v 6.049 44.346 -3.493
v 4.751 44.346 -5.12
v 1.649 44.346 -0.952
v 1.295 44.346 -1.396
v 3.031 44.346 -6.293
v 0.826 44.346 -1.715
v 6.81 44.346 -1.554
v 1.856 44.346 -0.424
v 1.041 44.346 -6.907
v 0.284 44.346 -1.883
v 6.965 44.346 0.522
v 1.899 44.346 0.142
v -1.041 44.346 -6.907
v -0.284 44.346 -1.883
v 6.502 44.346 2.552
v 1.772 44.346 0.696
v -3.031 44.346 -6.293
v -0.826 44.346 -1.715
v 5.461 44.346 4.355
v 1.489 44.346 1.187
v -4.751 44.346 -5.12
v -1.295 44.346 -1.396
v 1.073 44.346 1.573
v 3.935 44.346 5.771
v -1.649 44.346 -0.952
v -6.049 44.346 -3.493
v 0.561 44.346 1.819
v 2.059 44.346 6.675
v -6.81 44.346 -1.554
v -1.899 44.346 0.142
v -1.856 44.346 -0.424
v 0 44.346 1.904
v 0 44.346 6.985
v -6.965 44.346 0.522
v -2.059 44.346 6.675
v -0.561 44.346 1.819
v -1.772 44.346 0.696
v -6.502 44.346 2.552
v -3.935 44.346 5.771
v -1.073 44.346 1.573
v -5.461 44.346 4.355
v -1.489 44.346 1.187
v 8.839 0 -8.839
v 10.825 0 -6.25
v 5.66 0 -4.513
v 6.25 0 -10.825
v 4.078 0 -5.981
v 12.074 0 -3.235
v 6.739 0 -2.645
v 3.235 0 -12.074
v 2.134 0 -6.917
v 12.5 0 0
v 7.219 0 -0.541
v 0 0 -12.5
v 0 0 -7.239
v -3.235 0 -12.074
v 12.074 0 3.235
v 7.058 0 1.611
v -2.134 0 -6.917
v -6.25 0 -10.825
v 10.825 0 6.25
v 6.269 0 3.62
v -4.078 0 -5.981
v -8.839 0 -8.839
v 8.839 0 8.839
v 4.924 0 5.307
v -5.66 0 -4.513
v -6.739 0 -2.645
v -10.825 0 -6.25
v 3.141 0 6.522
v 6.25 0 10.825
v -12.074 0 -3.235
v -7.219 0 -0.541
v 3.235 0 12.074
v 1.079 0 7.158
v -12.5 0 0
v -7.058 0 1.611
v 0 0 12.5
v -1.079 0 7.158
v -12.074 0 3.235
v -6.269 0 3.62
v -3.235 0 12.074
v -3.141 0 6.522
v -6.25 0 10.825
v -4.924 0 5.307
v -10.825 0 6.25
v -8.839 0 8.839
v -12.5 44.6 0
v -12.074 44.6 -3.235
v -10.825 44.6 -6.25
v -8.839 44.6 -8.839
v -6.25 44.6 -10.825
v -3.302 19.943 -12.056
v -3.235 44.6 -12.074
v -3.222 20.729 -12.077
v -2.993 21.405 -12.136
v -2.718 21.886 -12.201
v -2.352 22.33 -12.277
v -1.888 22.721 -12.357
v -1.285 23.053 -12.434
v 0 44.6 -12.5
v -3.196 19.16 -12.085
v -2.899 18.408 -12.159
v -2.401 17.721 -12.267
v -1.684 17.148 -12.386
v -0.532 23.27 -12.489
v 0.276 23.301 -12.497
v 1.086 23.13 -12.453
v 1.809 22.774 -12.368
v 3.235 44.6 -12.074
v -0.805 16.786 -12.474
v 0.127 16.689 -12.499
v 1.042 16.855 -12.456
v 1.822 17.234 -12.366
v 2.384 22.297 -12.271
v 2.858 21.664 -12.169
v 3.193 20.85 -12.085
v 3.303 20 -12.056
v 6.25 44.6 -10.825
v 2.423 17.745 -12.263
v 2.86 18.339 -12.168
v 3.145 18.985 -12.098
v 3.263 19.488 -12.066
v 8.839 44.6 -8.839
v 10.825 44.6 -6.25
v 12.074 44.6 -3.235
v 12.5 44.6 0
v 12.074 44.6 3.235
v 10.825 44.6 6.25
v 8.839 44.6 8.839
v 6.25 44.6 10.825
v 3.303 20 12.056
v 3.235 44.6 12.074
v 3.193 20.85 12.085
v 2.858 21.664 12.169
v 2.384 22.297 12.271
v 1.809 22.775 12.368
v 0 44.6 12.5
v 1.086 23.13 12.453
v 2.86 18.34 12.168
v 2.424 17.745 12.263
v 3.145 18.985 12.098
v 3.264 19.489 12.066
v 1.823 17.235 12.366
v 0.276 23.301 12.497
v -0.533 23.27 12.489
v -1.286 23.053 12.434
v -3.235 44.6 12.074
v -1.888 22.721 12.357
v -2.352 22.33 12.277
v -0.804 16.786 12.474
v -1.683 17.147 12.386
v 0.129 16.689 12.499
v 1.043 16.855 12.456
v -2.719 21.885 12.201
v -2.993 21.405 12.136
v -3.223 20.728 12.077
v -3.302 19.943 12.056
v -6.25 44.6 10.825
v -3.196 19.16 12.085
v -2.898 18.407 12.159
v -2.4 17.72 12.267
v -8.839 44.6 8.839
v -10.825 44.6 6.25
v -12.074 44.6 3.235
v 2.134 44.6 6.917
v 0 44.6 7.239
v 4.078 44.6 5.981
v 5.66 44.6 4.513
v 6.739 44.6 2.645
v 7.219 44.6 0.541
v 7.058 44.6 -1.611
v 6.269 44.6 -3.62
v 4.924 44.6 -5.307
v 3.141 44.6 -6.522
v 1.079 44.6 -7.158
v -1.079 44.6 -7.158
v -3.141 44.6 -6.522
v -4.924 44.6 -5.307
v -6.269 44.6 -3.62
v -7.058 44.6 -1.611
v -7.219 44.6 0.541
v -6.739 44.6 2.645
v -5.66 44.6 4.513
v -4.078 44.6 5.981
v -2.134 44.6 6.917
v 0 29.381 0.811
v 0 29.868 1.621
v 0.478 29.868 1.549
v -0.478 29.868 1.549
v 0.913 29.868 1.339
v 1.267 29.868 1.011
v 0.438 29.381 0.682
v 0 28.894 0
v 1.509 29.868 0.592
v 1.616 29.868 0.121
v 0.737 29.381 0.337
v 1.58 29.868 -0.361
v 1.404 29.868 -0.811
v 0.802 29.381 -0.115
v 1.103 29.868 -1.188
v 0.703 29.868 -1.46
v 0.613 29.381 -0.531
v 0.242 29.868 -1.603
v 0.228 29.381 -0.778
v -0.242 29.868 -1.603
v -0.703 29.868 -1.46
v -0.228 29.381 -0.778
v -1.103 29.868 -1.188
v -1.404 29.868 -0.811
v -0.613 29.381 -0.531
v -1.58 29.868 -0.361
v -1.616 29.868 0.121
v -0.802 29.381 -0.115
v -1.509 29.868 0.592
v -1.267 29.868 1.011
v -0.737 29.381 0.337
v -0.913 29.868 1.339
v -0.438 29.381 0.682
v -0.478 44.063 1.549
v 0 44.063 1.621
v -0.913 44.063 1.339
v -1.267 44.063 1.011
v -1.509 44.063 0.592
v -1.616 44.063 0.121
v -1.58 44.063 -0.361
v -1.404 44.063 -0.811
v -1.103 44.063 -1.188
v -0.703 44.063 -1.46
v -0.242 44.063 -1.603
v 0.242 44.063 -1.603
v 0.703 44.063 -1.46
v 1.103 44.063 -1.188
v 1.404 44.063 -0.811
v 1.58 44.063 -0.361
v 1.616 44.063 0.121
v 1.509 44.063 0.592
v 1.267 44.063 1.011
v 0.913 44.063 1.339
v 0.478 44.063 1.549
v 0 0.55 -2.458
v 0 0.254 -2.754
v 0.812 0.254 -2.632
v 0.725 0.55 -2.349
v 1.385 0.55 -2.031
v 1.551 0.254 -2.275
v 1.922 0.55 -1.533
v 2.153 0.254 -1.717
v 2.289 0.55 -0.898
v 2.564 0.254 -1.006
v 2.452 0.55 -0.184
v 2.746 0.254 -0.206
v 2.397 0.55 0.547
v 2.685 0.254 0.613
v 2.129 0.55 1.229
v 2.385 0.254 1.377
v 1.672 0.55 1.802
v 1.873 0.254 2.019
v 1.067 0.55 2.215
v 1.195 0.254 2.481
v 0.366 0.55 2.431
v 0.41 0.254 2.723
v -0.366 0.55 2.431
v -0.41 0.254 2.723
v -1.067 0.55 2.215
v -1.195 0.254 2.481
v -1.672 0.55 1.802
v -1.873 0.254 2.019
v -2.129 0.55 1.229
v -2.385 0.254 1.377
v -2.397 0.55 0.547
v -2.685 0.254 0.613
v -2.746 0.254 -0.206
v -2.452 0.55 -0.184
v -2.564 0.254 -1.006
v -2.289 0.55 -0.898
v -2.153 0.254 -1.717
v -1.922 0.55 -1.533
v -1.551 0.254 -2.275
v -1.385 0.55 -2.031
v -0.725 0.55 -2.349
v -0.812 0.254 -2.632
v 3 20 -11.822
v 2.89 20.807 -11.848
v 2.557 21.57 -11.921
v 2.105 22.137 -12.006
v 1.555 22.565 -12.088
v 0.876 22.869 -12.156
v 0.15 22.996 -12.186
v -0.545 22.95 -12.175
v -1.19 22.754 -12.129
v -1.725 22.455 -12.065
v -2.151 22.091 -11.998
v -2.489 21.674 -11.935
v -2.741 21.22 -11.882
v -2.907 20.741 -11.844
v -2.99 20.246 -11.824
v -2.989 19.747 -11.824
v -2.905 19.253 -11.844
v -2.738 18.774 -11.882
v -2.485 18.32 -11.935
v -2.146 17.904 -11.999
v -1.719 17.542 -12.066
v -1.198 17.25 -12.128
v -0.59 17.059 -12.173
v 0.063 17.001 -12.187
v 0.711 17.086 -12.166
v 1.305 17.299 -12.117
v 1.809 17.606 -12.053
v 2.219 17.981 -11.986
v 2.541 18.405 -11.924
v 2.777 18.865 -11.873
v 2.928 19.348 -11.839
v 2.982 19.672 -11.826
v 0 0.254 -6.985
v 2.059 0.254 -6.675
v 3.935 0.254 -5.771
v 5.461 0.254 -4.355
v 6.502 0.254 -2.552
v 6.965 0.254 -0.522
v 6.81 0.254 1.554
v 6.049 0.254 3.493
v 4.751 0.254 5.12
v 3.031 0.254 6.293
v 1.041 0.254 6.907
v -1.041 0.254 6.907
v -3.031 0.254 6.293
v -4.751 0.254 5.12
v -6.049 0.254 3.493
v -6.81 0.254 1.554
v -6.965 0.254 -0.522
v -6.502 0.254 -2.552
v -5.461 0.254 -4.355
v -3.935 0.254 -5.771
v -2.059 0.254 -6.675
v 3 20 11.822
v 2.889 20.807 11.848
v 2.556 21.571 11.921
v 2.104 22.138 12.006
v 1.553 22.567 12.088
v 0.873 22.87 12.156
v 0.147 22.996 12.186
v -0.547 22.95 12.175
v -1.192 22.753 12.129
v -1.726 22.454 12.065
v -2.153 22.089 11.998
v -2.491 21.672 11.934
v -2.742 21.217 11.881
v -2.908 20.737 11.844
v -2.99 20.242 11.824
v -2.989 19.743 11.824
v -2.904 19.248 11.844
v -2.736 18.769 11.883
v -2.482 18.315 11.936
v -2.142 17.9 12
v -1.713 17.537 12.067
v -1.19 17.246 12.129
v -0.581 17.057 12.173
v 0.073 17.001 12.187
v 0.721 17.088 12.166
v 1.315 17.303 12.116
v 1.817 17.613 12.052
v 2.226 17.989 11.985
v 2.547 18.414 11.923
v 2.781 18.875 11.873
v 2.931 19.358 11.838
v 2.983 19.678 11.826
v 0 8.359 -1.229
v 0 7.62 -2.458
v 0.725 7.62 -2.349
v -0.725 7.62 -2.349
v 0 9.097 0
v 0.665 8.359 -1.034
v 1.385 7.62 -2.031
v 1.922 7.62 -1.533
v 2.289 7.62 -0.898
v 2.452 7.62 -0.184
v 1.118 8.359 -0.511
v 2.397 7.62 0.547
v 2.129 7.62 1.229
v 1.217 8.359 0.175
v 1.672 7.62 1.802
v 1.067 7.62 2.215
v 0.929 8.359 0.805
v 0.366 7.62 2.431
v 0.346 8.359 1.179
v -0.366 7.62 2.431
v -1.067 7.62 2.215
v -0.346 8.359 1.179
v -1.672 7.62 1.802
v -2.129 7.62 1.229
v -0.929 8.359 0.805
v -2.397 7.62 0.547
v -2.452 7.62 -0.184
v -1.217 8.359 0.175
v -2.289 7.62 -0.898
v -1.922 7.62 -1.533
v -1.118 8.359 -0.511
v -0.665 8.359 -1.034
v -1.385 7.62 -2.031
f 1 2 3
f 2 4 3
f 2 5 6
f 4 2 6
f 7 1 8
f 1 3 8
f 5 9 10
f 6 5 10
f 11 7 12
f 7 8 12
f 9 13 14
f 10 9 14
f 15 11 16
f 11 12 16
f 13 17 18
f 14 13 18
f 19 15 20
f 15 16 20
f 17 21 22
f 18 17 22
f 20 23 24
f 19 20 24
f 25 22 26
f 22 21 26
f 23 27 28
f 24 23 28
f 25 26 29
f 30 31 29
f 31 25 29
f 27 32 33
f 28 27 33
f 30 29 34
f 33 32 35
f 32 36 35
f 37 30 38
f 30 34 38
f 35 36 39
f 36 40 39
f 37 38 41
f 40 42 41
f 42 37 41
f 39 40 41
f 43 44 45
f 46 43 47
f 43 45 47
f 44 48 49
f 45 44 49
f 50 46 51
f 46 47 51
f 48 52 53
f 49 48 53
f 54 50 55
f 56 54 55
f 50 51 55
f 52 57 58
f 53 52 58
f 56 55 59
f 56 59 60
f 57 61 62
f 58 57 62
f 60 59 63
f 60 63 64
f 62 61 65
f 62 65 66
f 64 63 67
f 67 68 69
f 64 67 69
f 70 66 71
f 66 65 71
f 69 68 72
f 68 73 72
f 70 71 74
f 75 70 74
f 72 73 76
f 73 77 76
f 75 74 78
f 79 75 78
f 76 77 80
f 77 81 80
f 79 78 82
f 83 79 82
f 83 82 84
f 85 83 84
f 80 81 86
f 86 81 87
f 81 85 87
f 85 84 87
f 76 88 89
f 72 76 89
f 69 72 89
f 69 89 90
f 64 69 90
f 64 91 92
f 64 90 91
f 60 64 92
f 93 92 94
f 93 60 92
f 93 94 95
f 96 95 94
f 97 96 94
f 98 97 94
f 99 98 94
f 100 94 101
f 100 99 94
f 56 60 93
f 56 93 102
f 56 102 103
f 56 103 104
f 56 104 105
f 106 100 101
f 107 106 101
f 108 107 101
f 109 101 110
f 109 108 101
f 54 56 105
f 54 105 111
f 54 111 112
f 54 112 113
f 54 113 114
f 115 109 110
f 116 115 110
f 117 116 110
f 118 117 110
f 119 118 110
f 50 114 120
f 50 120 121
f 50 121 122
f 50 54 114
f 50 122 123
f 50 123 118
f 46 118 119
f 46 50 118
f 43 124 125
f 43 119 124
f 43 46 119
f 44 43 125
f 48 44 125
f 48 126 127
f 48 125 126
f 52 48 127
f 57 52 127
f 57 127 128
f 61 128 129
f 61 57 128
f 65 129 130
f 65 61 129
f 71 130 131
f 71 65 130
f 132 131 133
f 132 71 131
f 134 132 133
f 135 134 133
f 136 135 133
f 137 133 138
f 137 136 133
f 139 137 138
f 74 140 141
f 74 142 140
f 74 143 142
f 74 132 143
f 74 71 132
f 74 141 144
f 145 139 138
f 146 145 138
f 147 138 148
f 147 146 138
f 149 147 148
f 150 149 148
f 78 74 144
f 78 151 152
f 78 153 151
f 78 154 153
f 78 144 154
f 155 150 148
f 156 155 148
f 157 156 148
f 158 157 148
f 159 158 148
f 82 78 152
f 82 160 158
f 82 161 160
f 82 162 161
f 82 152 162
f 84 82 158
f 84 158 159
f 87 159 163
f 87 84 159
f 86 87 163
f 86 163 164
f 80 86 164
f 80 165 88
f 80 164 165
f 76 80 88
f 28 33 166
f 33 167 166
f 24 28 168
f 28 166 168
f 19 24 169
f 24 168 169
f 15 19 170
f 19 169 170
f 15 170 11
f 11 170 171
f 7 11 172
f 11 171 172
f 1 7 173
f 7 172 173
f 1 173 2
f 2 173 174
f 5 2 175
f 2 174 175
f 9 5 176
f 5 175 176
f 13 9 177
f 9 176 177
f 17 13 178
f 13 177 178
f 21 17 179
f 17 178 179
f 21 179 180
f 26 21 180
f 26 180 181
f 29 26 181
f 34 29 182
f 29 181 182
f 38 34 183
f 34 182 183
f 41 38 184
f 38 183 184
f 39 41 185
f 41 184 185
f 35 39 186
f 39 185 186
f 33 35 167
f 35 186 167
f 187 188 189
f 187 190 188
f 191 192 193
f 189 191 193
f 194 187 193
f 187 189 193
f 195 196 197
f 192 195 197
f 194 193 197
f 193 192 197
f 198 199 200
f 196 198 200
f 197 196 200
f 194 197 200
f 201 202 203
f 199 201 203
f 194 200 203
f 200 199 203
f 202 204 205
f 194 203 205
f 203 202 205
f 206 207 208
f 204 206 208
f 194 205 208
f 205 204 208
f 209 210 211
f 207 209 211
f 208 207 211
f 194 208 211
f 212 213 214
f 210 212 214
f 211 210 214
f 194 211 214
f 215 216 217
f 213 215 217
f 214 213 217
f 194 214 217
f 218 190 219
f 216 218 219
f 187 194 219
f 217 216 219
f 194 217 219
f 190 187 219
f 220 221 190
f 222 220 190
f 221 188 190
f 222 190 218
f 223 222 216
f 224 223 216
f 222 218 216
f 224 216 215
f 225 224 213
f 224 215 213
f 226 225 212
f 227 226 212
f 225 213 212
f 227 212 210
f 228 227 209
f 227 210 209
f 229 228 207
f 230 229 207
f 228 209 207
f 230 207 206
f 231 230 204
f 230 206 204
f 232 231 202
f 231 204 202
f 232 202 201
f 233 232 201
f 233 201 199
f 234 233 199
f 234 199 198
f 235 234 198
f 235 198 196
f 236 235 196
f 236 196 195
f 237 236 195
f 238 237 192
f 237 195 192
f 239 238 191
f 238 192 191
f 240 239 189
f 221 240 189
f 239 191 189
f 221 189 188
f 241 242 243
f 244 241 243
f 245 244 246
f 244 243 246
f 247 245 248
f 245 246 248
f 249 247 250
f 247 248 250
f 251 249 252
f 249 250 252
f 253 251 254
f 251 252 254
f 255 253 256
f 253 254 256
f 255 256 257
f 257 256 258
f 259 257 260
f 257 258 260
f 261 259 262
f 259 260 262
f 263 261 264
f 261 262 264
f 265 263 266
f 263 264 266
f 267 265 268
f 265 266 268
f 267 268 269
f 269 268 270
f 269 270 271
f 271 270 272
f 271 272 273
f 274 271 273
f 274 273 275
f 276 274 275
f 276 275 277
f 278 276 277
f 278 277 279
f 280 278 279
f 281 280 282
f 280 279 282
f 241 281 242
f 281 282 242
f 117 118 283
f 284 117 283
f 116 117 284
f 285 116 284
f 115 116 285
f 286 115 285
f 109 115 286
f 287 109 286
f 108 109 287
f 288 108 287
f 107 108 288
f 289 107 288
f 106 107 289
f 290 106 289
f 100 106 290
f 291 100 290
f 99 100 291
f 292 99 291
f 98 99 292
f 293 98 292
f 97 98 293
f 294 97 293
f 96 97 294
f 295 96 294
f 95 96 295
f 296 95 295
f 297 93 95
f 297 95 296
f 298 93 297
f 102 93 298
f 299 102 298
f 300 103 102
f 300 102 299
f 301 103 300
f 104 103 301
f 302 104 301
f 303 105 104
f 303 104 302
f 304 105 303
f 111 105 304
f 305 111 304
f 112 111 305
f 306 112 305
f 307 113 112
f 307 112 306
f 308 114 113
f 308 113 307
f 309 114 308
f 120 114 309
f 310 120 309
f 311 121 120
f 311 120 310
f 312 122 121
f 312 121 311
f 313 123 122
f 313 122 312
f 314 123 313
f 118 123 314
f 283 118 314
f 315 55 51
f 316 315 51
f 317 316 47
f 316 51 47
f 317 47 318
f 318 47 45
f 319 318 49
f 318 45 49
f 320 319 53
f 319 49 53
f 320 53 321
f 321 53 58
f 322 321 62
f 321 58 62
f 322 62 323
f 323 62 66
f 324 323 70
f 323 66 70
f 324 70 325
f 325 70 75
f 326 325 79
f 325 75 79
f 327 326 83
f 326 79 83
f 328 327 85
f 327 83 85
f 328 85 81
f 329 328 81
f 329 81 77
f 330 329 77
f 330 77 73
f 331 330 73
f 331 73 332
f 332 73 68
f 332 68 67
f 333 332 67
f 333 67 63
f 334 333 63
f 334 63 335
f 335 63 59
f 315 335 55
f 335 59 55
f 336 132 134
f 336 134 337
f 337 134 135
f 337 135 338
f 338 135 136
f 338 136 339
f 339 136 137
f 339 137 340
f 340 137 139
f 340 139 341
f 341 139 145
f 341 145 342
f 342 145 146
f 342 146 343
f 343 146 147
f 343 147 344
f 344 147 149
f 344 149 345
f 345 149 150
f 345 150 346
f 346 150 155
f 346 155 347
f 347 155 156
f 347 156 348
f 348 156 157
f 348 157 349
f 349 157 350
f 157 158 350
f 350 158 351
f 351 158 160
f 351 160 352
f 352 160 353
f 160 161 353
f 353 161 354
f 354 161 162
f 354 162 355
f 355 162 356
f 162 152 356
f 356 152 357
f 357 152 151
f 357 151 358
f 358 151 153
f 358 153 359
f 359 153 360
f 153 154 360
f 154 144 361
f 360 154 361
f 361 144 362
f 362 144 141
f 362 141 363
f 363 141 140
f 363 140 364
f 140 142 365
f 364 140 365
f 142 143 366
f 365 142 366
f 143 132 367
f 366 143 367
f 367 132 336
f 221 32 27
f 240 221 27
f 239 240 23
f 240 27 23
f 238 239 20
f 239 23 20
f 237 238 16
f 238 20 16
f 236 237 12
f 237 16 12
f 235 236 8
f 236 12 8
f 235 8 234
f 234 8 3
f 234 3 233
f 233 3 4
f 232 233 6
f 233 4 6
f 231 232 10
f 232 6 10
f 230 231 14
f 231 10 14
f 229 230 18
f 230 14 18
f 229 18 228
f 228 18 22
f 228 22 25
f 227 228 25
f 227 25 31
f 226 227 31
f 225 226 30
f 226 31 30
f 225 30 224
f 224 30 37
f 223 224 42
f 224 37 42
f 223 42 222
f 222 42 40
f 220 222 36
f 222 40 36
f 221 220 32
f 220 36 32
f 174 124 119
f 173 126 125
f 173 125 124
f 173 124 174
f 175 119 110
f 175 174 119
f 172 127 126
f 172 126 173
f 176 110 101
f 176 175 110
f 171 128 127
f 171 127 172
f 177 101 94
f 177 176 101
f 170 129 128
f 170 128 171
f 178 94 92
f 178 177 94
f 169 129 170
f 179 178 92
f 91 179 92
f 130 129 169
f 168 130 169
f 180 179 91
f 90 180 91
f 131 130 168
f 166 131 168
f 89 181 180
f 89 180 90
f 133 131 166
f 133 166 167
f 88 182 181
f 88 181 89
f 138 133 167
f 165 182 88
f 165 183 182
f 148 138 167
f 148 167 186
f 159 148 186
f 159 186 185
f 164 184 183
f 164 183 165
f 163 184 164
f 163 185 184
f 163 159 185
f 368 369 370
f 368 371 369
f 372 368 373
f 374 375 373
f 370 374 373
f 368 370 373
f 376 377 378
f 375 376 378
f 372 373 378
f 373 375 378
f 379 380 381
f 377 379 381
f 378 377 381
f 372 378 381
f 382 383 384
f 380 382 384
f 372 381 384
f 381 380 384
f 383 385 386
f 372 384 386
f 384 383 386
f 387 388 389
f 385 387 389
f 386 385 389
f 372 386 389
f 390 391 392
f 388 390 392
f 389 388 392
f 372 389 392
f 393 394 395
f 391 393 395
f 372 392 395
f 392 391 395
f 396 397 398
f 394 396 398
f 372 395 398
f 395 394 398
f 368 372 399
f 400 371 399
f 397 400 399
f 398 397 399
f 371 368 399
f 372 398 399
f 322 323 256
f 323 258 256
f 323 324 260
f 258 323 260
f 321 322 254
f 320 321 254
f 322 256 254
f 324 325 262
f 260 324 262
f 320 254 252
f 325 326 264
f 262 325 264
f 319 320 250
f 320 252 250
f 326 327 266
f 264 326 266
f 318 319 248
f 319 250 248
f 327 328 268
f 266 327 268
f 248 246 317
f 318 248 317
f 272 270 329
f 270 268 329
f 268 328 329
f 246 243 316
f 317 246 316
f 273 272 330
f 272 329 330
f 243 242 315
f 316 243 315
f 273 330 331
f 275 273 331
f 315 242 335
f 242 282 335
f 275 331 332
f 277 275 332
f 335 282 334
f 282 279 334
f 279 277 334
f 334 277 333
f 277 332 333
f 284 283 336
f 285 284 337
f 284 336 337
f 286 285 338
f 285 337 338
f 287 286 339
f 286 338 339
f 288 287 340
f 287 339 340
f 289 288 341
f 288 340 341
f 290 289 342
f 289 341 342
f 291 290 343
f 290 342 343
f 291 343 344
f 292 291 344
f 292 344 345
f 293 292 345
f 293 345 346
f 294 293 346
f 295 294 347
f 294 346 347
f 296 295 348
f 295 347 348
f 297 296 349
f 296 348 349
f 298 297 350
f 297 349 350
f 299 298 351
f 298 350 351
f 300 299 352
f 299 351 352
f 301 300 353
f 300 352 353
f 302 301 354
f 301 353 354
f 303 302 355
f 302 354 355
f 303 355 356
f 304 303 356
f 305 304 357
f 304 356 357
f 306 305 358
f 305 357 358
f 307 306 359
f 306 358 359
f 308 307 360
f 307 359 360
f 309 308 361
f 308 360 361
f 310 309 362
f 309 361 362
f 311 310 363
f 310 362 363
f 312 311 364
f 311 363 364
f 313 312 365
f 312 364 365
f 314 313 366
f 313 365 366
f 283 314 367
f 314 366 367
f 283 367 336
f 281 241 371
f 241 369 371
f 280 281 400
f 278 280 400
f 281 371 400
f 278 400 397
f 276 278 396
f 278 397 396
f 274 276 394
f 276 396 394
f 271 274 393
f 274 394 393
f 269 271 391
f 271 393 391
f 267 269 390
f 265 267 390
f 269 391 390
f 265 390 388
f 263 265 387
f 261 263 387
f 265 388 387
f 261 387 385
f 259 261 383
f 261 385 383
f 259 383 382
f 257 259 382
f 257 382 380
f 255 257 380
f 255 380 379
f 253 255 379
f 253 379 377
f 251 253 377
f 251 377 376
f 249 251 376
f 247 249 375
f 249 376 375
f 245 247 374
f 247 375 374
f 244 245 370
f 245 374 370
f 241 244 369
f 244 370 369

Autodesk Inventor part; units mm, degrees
ref_plane "YZ Plane" through (0, 0, 0) normal (1, 0, 0) x (0, 1, 0)
ref_plane "XZ Plane" through (0, 0, 0) normal (0, 1, 0) x (-1, 0, 0)
ref_plane "XY Plane" through (0, 0, 0) normal (0, 0, 1) x (1, 0, 0)
sketch "Sketch1" plane through (0, 0, 0) normal (0, 1, 0) x (-1, 0, 0)
  circle A0 centre (0, 0) radius 12.5
  dimension "d0" = 25
extrude "Extrusion1" add sketch "Sketch1" along normal blind 44.6
hole "ReliefTop" at (0, 44.6, 0) direction (0, -1, 0) diameter 13.97 depth 0.254 countersink diameter 14.478 countersink angle 90
hole "ReliefBottom" at (0, 0, 0) direction (0, 1, 0) diameter 13.97 depth 0.254 countersink diameter 14.478 countersink angle 90
hole "MountBottomM6" at (0, 0.254, 0) direction (0, 1, 0) diameter 4.917 depth 7.366 tip angle 118 countersink diameter 5.508 countersink angle 90 thread size "M6x1" class "6H" standard "ISO Metric profile"
hole "MountTopM4" at (0, 44.346, 0) direction (0, -1, 0) diameter 3.242 depth 14.478 tip angle 118 countersink diameter 3.808 countersink angle 90 thread size "M4x0.7" class "6H" standard "ISO Metric profile"
sketch "Sketch2" plane through (0, 0, 0) normal (0, 0, 1) x (1, 0, 0)
  circle A0 centre (0, 20) radius 3
  line L0 (-12.5, 0) -> (12.5, 0) projected
  line L1 (0, -4.6) -> (0, 27.6) projected
  point P0 (0, 0)
  dimension "d49" = 6
  dimension "d50" = 20
extrude "Extrusion2" cut sketch "Sketch2" along normal through all both and the other way through all
chamfer "Chamfer1" distance 0.313 angle 45 2 edges at (-3, 19.9998, 12.1347) (-3, 19.9998, -12.1347)
equation "\"d1\" = height"
equation "\"d5\" = reliefMinor"
equation "\"d7\" = reliefMajor"
equation "\"d10\" = reliefDepth"
equation "\"d14\" = reliefMinor"
equation "\"d16\" = reliefMajor"
equation "\"d19\" = reliefDepth"
equation "\"d25\" = chamferM6"
equation "\"d28\" = depthM6"
equation "\"d40\" = chamferM4"
equation "\"d43\" = depthM4"
equation "\"reliefDepth\" = 0.254"
equation "\"reliefMinor\" = 13.97"
equation "\"reliefMajor\" = 14.478"
equation "\"chamferM6\" = 5.508"
equation "\"chamferM4\" = 3.808"
equation "\"depthM6\" = 7.366"
equation "\"depthM4\" = 14.478"
equation "\"height\" = 44.6"
properties part number "PLS-P642H0446A00_M" material "Stainless Steel"
